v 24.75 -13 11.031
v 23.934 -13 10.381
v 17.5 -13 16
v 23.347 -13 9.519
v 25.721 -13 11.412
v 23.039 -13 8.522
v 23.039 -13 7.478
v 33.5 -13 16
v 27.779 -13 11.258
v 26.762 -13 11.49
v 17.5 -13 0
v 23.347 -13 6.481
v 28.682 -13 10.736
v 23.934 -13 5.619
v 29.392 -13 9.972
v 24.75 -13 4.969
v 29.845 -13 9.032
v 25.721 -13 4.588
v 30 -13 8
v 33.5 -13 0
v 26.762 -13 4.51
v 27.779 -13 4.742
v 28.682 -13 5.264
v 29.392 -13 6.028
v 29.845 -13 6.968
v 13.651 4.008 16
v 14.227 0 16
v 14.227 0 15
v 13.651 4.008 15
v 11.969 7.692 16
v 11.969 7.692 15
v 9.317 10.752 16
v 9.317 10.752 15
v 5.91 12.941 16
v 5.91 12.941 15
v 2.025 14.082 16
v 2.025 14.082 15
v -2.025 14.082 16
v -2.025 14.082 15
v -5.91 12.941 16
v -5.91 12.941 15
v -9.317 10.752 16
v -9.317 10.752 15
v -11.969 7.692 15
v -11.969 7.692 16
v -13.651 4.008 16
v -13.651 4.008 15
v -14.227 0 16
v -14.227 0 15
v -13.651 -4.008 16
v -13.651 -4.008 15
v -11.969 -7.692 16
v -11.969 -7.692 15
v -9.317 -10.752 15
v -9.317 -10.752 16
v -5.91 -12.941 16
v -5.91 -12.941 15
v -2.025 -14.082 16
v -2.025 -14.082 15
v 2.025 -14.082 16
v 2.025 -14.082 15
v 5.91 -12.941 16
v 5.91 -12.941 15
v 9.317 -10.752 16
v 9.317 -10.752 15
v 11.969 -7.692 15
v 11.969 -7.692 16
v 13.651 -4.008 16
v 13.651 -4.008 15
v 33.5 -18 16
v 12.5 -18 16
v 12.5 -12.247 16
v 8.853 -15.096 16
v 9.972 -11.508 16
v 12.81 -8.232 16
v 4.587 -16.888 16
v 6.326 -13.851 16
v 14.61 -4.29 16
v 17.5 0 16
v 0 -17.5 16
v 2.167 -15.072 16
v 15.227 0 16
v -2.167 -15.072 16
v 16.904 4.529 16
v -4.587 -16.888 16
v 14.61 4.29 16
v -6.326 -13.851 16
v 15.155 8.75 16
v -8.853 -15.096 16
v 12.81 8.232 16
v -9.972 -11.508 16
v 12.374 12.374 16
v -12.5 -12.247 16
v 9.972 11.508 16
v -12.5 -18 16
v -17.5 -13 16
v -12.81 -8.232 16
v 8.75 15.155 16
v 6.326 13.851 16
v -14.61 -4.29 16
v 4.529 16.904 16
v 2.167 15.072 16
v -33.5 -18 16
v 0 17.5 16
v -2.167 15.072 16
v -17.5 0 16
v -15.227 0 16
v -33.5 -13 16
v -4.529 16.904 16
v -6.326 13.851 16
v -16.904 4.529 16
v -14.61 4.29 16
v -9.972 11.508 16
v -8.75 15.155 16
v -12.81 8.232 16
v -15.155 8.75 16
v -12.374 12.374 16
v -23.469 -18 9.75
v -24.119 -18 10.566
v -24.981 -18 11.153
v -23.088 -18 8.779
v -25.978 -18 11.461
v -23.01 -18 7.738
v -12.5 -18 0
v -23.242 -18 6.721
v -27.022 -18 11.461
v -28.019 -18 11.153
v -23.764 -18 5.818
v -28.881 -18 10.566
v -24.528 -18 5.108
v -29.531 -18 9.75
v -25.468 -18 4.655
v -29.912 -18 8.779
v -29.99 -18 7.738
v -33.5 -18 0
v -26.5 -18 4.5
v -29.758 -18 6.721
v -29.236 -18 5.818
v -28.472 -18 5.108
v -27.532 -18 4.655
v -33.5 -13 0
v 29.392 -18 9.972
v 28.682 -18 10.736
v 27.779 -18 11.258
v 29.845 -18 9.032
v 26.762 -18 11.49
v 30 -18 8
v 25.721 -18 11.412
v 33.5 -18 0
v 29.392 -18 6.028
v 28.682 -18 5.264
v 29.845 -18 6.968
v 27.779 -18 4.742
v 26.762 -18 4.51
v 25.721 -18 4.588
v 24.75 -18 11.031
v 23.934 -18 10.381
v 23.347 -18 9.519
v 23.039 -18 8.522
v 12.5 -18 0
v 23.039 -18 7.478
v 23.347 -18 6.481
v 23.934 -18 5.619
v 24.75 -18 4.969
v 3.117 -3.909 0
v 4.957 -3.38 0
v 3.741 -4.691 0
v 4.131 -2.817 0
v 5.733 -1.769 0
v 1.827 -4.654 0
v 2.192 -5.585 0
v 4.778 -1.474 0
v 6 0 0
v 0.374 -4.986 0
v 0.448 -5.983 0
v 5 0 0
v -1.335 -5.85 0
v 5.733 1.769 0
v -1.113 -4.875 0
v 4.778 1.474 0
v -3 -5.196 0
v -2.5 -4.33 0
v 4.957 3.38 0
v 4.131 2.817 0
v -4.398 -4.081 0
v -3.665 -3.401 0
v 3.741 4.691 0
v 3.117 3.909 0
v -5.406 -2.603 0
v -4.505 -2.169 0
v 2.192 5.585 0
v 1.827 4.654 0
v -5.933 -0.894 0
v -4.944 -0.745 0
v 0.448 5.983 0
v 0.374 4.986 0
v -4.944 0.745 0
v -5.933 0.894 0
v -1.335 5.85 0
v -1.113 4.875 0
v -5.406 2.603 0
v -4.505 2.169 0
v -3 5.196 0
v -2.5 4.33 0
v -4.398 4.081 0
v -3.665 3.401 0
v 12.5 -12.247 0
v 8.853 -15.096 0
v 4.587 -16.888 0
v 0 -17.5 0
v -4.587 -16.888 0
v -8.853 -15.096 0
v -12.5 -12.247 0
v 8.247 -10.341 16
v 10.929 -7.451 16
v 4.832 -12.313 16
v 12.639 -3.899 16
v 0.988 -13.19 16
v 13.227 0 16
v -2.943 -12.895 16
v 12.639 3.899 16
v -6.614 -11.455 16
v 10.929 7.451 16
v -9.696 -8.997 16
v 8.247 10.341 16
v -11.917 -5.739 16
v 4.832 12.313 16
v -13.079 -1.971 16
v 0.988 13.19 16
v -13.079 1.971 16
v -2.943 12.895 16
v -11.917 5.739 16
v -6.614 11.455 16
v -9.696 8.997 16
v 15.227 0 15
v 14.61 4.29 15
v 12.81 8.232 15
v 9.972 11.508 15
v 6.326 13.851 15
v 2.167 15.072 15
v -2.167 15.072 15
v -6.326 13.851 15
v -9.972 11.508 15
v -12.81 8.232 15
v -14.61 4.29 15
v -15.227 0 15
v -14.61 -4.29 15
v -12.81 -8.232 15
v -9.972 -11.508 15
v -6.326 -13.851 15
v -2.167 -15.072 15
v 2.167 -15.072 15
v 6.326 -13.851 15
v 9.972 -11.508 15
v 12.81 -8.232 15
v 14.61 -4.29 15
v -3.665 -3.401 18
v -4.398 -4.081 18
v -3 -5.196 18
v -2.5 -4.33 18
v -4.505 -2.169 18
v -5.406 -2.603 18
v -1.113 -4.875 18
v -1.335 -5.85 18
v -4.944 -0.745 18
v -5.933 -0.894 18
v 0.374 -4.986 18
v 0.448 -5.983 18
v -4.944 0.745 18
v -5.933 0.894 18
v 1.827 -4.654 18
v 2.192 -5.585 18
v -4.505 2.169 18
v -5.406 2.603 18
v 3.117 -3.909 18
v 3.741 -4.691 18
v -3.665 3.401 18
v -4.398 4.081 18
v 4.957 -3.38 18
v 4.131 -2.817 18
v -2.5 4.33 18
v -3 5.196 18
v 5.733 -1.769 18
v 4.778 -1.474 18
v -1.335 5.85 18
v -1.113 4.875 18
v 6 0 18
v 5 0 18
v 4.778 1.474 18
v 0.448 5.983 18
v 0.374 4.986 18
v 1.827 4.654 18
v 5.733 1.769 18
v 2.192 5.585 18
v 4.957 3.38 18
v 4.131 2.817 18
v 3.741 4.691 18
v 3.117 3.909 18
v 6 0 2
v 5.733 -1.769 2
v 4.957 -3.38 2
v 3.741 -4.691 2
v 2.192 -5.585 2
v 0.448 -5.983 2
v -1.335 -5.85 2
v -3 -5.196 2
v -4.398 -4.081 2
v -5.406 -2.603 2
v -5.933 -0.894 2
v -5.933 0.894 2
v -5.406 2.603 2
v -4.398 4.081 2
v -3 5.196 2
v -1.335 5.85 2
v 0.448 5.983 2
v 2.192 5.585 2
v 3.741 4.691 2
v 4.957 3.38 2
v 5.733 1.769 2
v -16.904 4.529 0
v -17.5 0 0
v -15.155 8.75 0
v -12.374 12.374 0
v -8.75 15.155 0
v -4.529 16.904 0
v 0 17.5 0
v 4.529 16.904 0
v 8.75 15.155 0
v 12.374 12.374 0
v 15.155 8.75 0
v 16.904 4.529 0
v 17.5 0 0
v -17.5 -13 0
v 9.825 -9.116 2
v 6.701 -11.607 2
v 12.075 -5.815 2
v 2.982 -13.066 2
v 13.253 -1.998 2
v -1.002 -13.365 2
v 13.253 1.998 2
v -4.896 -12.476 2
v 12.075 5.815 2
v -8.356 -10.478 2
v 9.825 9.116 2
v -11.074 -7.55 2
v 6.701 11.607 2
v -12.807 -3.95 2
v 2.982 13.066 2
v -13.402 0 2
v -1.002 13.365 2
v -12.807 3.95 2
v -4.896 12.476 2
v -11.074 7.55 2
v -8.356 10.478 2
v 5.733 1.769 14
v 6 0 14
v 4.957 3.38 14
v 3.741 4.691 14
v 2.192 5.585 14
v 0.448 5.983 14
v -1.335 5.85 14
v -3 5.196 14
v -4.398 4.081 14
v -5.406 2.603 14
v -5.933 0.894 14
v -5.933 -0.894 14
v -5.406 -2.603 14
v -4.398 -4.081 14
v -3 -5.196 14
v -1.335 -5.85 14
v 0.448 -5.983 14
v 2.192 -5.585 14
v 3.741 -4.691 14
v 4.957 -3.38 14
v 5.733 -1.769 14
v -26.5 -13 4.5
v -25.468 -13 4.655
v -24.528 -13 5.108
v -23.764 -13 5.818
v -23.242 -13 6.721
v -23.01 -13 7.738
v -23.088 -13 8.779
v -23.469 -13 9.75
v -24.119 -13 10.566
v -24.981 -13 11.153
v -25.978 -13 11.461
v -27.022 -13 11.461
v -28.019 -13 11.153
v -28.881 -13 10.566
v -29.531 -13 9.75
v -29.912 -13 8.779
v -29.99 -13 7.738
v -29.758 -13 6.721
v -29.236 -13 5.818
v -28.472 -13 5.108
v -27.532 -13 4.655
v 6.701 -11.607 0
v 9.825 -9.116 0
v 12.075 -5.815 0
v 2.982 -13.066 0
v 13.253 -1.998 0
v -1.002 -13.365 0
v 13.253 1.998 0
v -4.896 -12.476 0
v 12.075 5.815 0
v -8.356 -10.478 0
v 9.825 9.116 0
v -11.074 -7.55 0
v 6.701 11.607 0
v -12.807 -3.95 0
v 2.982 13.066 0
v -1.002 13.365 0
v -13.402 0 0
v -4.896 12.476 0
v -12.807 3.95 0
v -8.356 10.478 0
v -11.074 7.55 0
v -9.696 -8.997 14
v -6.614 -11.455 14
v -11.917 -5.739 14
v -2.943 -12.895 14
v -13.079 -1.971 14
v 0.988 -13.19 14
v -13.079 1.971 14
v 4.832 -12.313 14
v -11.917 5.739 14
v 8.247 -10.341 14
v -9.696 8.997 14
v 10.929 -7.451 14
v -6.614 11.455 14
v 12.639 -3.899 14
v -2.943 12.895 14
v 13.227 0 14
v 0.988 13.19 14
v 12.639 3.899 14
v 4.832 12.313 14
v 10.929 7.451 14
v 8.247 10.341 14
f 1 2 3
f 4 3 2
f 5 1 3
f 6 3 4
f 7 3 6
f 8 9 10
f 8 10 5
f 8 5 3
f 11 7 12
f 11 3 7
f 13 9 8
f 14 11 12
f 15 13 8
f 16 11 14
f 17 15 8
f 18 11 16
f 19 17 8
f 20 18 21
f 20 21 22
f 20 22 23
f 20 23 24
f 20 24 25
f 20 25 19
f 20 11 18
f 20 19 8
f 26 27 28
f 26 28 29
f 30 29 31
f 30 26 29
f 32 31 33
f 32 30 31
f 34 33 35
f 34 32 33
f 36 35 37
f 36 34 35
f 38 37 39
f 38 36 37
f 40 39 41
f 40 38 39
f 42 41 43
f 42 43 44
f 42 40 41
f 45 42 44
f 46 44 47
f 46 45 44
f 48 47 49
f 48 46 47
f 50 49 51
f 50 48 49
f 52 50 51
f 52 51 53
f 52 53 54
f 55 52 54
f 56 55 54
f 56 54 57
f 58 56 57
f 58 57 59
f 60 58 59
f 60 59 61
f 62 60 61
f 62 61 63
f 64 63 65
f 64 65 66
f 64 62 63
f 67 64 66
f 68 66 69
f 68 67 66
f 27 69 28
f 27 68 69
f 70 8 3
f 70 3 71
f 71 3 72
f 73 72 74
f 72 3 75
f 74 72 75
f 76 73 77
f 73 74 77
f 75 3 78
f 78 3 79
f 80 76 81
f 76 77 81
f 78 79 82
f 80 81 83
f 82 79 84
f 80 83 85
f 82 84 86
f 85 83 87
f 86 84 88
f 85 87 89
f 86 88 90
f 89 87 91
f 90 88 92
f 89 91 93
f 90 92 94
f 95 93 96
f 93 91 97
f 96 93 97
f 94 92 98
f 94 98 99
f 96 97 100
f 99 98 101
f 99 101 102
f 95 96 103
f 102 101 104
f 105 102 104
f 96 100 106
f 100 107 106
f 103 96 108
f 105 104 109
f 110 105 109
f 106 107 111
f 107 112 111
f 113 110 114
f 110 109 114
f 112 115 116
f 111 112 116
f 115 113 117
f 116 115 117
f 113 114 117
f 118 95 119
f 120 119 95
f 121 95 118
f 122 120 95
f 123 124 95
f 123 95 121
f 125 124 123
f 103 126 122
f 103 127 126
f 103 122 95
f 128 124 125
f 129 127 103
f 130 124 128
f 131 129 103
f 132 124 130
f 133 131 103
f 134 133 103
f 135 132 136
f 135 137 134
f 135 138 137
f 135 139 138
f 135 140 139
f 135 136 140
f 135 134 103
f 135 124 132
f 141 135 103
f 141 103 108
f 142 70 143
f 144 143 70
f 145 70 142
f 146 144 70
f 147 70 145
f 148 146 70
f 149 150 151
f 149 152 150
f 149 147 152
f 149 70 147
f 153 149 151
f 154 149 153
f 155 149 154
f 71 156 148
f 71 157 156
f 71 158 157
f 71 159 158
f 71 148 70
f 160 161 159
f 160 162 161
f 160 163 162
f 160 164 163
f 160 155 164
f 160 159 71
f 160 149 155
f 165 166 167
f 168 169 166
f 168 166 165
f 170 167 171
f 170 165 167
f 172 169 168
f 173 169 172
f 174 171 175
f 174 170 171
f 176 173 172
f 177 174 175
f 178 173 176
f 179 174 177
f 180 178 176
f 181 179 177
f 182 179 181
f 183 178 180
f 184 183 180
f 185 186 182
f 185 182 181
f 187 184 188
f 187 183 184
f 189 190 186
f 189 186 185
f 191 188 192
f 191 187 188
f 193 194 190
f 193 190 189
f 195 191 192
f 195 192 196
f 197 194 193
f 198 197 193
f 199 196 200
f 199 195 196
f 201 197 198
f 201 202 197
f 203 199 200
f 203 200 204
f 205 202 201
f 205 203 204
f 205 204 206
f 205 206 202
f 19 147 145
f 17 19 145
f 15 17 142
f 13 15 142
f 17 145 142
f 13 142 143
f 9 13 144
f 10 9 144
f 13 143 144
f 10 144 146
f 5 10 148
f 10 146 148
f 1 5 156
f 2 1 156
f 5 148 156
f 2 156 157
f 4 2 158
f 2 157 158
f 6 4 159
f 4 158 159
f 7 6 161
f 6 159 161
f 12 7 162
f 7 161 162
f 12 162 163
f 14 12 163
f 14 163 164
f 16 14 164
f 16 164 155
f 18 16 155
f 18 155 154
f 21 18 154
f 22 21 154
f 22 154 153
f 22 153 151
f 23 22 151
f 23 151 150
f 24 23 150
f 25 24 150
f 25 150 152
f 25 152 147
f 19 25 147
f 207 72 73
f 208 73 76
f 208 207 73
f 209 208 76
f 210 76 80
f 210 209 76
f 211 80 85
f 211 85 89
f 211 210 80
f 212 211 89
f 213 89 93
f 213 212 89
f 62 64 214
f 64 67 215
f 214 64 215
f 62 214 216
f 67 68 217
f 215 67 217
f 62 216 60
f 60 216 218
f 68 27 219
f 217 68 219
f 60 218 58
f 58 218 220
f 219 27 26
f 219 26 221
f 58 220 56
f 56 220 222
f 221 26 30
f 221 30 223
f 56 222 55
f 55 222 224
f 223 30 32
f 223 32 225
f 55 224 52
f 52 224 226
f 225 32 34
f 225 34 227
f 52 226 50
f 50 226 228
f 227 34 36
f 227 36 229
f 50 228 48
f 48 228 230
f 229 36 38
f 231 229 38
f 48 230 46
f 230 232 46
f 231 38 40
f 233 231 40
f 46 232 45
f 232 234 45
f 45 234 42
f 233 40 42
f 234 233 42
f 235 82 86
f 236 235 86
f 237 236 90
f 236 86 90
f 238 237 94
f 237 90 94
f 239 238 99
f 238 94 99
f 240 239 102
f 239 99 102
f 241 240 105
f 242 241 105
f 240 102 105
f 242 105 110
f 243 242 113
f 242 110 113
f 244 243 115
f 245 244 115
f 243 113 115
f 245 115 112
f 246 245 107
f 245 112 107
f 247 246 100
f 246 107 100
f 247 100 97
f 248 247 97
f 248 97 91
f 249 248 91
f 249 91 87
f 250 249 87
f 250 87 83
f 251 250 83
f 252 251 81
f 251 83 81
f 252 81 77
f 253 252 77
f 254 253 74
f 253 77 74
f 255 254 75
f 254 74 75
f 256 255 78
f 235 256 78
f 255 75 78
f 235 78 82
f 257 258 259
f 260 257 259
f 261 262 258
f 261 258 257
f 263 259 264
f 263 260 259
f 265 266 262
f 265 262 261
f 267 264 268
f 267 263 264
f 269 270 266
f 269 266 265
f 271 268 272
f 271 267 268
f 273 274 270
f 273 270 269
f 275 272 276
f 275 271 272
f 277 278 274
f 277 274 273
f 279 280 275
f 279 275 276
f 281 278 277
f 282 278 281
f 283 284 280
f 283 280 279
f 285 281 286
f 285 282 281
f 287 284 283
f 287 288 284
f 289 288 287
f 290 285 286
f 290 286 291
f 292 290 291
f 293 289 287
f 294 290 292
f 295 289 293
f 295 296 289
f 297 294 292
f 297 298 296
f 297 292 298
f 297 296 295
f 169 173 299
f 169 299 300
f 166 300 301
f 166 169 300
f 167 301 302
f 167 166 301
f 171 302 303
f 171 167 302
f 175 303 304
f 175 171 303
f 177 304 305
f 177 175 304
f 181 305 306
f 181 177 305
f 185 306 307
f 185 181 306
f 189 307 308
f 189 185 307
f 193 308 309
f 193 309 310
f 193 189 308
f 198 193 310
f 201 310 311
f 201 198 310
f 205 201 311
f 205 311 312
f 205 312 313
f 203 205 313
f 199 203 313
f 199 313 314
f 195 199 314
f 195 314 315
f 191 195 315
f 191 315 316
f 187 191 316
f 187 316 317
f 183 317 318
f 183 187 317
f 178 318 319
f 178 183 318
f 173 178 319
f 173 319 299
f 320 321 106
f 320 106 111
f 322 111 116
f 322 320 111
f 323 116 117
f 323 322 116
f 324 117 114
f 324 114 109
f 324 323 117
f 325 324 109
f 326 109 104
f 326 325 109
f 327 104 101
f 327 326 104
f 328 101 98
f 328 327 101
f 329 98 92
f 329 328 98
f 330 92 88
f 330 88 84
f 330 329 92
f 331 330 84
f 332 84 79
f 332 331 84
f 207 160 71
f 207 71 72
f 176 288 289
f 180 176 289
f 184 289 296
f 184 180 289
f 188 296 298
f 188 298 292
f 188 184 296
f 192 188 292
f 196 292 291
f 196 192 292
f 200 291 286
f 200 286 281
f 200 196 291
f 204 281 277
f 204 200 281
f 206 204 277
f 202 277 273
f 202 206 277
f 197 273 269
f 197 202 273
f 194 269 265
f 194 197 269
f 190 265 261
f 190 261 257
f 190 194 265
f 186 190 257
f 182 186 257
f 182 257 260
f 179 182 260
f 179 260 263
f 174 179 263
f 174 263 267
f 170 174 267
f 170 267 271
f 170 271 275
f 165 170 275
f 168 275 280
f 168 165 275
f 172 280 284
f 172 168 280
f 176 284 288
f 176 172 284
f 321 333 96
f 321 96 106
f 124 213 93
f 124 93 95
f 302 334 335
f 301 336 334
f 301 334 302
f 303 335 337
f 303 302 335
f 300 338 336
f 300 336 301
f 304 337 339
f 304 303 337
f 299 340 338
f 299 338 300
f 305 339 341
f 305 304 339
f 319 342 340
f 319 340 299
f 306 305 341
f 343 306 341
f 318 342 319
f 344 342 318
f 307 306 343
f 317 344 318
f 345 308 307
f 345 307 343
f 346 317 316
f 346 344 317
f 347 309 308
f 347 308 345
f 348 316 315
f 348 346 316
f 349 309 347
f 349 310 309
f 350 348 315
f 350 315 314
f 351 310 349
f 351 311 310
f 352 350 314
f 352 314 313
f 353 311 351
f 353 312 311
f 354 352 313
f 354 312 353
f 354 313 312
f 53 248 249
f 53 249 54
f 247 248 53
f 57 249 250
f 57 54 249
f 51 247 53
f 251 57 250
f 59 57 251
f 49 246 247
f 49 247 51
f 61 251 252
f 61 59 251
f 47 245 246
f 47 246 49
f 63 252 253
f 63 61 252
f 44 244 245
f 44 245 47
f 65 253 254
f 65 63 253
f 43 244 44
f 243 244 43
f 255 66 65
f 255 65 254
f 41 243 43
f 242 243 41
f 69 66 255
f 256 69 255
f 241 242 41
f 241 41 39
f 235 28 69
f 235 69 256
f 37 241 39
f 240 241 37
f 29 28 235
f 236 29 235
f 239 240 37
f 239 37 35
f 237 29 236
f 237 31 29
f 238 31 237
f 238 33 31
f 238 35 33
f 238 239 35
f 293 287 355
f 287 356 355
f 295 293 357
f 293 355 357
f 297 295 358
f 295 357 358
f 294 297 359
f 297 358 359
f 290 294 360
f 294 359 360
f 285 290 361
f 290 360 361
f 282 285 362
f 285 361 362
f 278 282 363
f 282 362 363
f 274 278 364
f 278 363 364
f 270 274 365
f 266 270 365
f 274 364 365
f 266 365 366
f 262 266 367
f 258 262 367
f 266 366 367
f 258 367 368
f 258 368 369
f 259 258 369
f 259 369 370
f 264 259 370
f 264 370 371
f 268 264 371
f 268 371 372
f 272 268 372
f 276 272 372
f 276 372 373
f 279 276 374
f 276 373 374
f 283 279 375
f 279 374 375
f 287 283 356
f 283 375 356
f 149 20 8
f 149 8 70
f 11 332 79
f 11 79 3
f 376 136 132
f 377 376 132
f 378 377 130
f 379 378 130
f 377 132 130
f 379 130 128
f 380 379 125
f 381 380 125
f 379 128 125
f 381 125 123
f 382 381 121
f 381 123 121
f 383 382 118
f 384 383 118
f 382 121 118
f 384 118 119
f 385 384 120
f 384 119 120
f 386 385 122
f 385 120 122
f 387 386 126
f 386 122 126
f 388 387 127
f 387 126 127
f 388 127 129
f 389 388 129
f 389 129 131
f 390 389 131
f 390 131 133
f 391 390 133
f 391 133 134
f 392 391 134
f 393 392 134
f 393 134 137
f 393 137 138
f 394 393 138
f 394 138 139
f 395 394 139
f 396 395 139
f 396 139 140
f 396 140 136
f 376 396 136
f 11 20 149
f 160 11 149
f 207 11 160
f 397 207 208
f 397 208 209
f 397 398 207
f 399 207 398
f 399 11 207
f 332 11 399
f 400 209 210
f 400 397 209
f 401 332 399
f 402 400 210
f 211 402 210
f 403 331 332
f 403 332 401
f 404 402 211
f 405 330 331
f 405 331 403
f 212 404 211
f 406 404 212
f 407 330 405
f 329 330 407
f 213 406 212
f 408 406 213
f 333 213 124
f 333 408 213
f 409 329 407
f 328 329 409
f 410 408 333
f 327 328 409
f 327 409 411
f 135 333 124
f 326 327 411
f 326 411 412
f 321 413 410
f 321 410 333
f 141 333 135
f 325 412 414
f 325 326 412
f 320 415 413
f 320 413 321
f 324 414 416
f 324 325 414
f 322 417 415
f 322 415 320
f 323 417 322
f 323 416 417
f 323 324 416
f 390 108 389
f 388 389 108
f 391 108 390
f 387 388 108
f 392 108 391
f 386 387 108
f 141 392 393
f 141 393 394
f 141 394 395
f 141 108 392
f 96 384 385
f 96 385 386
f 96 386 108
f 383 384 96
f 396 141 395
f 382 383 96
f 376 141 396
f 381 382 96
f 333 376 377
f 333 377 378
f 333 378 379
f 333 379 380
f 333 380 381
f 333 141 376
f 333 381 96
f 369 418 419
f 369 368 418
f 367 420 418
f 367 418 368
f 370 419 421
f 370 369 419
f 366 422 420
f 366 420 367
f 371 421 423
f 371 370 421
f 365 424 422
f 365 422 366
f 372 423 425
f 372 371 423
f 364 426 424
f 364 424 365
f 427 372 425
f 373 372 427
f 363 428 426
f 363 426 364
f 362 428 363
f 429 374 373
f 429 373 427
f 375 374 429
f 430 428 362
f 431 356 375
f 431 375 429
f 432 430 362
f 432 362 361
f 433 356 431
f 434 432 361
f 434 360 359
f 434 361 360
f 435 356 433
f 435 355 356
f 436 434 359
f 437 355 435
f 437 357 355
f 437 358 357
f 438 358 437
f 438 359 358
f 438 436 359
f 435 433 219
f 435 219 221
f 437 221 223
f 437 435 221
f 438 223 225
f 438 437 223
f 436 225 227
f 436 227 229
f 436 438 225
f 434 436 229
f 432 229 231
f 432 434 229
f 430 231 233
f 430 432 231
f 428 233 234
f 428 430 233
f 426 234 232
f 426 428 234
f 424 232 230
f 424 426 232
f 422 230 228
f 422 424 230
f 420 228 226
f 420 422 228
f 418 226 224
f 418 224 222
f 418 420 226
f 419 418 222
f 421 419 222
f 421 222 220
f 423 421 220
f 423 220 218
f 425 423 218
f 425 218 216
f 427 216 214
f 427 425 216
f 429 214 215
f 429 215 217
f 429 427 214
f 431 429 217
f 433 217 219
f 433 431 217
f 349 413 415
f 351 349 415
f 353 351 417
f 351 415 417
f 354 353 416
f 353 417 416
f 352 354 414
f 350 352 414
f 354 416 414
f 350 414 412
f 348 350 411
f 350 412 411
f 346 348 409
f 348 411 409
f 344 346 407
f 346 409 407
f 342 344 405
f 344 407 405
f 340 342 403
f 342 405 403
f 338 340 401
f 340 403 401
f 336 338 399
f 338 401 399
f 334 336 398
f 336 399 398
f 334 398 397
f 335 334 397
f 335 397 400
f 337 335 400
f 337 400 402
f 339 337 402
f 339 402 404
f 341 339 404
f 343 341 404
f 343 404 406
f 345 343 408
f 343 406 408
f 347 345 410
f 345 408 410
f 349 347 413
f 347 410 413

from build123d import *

# Parameters (mm, degrees)
SKETCH_1_R          = 5
EXTRUDE_1_DEPTH     = 16
SKETCH_2_R          = 6
SKETCH_2_R_2        = 5
EXTRUDE_2_DEPTH     = 2
CUT_EXTRUDE_START   = -2
SKETCH_3_R          = 13.227089176
SKETCH_3_R_2        = 6
CUT_EXTRUDE_1_DEPTH = 2
SKETCH_4_R          = 13.402399482
SKETCH_4_R_2        = 6
CUT_EXTRUDE_2_DEPTH = 2
SKETCH_5_R          = 15.227089176
SKETCH_5_R_2        = 14.227089176
CUT_EXTRUDE_3_DEPTH = 1
SKETCH_6_R          = 3.5
CUT_EXTRUDE_4_DEPTH = 10


with BuildPart() as part:
    # 草图1 → 凸台-拉伸1 (new body)
    with BuildSketch(Plane.XY):
        with BuildLine():
            Line((-12.5, -18), (-33.5, -18))
            Line((-33.5, -18), (-33.5, -13))
            Line((-33.5, -13), (-17.5, -13))
            Line((-17.5, -13), (-17.5, 0))
            ThreePointArc((-17.5, 0), (0, 17.5), (17.5, 0))
            Line((17.5, 0), (17.5, -13))
            Line((17.5, -13), (33.5, -13))
            Line((33.5, -13), (33.5, -18))
            Line((33.5, -18), (12.5, -18))
            Line((12.5, -18), (12.5, -12.247448714))
            ThreePointArc((12.5, -12.247448714), (0, -17.5), (-12.5, -12.247448714))
            Line((-12.5, -12.247448714), (-12.5, -18))
        make_face()
        Circle(SKETCH_1_R, mode=Mode.SUBTRACT)
    extrude(amount=EXTRUDE_1_DEPTH)

    # 草图2 → 凸台-拉伸2 (add)
    with BuildSketch(Plane.XY.offset(16)):
        Circle(SKETCH_2_R)
        Circle(SKETCH_2_R_2, mode=Mode.SUBTRACT)
    extrude(amount=EXTRUDE_2_DEPTH)

    # 草图3 → 切除-拉伸1 (cut)
    with BuildSketch(Plane.XY.offset(16).offset(CUT_EXTRUDE_START)):
        Circle(SKETCH_3_R)
        Circle(SKETCH_3_R_2, mode=Mode.SUBTRACT)
    extrude(amount=CUT_EXTRUDE_1_DEPTH, mode=Mode.SUBTRACT)

    # 草图4 → 切除-拉伸2 (cut)
    with BuildSketch(Plane(origin=(0, 0, 0), x_dir=(-1, 0, 0), z_dir=(0, 0, -1))):
        Circle(SKETCH_4_R)
        with Locations(Location((0, 0, 0), (0, 0, 180))):
            Circle(SKETCH_4_R_2, mode=Mode.SUBTRACT)
    extrude(amount=-CUT_EXTRUDE_2_DEPTH, mode=Mode.SUBTRACT)

    # 草图5 → 切除-拉伸3 (cut)
    with BuildSketch(Plane.XY.offset(16)):
        Circle(SKETCH_5_R)
        Circle(SKETCH_5_R_2, mode=Mode.SUBTRACT)
    extrude(amount=-CUT_EXTRUDE_3_DEPTH, mode=Mode.SUBTRACT)

    # 草图6 → 切除-拉伸4 (cut)
    with BuildSketch(Plane.XZ.offset(18)):
        with Locations((26.5, 8)):
            Circle(SKETCH_6_R)
        with Locations(Location((-26.5, 8, 0), (0, 0, 270))):
            Circle(SKETCH_6_R)
    extrude(amount=-CUT_EXTRUDE_4_DEPTH, mode=Mode.SUBTRACT)


solid = part.part
